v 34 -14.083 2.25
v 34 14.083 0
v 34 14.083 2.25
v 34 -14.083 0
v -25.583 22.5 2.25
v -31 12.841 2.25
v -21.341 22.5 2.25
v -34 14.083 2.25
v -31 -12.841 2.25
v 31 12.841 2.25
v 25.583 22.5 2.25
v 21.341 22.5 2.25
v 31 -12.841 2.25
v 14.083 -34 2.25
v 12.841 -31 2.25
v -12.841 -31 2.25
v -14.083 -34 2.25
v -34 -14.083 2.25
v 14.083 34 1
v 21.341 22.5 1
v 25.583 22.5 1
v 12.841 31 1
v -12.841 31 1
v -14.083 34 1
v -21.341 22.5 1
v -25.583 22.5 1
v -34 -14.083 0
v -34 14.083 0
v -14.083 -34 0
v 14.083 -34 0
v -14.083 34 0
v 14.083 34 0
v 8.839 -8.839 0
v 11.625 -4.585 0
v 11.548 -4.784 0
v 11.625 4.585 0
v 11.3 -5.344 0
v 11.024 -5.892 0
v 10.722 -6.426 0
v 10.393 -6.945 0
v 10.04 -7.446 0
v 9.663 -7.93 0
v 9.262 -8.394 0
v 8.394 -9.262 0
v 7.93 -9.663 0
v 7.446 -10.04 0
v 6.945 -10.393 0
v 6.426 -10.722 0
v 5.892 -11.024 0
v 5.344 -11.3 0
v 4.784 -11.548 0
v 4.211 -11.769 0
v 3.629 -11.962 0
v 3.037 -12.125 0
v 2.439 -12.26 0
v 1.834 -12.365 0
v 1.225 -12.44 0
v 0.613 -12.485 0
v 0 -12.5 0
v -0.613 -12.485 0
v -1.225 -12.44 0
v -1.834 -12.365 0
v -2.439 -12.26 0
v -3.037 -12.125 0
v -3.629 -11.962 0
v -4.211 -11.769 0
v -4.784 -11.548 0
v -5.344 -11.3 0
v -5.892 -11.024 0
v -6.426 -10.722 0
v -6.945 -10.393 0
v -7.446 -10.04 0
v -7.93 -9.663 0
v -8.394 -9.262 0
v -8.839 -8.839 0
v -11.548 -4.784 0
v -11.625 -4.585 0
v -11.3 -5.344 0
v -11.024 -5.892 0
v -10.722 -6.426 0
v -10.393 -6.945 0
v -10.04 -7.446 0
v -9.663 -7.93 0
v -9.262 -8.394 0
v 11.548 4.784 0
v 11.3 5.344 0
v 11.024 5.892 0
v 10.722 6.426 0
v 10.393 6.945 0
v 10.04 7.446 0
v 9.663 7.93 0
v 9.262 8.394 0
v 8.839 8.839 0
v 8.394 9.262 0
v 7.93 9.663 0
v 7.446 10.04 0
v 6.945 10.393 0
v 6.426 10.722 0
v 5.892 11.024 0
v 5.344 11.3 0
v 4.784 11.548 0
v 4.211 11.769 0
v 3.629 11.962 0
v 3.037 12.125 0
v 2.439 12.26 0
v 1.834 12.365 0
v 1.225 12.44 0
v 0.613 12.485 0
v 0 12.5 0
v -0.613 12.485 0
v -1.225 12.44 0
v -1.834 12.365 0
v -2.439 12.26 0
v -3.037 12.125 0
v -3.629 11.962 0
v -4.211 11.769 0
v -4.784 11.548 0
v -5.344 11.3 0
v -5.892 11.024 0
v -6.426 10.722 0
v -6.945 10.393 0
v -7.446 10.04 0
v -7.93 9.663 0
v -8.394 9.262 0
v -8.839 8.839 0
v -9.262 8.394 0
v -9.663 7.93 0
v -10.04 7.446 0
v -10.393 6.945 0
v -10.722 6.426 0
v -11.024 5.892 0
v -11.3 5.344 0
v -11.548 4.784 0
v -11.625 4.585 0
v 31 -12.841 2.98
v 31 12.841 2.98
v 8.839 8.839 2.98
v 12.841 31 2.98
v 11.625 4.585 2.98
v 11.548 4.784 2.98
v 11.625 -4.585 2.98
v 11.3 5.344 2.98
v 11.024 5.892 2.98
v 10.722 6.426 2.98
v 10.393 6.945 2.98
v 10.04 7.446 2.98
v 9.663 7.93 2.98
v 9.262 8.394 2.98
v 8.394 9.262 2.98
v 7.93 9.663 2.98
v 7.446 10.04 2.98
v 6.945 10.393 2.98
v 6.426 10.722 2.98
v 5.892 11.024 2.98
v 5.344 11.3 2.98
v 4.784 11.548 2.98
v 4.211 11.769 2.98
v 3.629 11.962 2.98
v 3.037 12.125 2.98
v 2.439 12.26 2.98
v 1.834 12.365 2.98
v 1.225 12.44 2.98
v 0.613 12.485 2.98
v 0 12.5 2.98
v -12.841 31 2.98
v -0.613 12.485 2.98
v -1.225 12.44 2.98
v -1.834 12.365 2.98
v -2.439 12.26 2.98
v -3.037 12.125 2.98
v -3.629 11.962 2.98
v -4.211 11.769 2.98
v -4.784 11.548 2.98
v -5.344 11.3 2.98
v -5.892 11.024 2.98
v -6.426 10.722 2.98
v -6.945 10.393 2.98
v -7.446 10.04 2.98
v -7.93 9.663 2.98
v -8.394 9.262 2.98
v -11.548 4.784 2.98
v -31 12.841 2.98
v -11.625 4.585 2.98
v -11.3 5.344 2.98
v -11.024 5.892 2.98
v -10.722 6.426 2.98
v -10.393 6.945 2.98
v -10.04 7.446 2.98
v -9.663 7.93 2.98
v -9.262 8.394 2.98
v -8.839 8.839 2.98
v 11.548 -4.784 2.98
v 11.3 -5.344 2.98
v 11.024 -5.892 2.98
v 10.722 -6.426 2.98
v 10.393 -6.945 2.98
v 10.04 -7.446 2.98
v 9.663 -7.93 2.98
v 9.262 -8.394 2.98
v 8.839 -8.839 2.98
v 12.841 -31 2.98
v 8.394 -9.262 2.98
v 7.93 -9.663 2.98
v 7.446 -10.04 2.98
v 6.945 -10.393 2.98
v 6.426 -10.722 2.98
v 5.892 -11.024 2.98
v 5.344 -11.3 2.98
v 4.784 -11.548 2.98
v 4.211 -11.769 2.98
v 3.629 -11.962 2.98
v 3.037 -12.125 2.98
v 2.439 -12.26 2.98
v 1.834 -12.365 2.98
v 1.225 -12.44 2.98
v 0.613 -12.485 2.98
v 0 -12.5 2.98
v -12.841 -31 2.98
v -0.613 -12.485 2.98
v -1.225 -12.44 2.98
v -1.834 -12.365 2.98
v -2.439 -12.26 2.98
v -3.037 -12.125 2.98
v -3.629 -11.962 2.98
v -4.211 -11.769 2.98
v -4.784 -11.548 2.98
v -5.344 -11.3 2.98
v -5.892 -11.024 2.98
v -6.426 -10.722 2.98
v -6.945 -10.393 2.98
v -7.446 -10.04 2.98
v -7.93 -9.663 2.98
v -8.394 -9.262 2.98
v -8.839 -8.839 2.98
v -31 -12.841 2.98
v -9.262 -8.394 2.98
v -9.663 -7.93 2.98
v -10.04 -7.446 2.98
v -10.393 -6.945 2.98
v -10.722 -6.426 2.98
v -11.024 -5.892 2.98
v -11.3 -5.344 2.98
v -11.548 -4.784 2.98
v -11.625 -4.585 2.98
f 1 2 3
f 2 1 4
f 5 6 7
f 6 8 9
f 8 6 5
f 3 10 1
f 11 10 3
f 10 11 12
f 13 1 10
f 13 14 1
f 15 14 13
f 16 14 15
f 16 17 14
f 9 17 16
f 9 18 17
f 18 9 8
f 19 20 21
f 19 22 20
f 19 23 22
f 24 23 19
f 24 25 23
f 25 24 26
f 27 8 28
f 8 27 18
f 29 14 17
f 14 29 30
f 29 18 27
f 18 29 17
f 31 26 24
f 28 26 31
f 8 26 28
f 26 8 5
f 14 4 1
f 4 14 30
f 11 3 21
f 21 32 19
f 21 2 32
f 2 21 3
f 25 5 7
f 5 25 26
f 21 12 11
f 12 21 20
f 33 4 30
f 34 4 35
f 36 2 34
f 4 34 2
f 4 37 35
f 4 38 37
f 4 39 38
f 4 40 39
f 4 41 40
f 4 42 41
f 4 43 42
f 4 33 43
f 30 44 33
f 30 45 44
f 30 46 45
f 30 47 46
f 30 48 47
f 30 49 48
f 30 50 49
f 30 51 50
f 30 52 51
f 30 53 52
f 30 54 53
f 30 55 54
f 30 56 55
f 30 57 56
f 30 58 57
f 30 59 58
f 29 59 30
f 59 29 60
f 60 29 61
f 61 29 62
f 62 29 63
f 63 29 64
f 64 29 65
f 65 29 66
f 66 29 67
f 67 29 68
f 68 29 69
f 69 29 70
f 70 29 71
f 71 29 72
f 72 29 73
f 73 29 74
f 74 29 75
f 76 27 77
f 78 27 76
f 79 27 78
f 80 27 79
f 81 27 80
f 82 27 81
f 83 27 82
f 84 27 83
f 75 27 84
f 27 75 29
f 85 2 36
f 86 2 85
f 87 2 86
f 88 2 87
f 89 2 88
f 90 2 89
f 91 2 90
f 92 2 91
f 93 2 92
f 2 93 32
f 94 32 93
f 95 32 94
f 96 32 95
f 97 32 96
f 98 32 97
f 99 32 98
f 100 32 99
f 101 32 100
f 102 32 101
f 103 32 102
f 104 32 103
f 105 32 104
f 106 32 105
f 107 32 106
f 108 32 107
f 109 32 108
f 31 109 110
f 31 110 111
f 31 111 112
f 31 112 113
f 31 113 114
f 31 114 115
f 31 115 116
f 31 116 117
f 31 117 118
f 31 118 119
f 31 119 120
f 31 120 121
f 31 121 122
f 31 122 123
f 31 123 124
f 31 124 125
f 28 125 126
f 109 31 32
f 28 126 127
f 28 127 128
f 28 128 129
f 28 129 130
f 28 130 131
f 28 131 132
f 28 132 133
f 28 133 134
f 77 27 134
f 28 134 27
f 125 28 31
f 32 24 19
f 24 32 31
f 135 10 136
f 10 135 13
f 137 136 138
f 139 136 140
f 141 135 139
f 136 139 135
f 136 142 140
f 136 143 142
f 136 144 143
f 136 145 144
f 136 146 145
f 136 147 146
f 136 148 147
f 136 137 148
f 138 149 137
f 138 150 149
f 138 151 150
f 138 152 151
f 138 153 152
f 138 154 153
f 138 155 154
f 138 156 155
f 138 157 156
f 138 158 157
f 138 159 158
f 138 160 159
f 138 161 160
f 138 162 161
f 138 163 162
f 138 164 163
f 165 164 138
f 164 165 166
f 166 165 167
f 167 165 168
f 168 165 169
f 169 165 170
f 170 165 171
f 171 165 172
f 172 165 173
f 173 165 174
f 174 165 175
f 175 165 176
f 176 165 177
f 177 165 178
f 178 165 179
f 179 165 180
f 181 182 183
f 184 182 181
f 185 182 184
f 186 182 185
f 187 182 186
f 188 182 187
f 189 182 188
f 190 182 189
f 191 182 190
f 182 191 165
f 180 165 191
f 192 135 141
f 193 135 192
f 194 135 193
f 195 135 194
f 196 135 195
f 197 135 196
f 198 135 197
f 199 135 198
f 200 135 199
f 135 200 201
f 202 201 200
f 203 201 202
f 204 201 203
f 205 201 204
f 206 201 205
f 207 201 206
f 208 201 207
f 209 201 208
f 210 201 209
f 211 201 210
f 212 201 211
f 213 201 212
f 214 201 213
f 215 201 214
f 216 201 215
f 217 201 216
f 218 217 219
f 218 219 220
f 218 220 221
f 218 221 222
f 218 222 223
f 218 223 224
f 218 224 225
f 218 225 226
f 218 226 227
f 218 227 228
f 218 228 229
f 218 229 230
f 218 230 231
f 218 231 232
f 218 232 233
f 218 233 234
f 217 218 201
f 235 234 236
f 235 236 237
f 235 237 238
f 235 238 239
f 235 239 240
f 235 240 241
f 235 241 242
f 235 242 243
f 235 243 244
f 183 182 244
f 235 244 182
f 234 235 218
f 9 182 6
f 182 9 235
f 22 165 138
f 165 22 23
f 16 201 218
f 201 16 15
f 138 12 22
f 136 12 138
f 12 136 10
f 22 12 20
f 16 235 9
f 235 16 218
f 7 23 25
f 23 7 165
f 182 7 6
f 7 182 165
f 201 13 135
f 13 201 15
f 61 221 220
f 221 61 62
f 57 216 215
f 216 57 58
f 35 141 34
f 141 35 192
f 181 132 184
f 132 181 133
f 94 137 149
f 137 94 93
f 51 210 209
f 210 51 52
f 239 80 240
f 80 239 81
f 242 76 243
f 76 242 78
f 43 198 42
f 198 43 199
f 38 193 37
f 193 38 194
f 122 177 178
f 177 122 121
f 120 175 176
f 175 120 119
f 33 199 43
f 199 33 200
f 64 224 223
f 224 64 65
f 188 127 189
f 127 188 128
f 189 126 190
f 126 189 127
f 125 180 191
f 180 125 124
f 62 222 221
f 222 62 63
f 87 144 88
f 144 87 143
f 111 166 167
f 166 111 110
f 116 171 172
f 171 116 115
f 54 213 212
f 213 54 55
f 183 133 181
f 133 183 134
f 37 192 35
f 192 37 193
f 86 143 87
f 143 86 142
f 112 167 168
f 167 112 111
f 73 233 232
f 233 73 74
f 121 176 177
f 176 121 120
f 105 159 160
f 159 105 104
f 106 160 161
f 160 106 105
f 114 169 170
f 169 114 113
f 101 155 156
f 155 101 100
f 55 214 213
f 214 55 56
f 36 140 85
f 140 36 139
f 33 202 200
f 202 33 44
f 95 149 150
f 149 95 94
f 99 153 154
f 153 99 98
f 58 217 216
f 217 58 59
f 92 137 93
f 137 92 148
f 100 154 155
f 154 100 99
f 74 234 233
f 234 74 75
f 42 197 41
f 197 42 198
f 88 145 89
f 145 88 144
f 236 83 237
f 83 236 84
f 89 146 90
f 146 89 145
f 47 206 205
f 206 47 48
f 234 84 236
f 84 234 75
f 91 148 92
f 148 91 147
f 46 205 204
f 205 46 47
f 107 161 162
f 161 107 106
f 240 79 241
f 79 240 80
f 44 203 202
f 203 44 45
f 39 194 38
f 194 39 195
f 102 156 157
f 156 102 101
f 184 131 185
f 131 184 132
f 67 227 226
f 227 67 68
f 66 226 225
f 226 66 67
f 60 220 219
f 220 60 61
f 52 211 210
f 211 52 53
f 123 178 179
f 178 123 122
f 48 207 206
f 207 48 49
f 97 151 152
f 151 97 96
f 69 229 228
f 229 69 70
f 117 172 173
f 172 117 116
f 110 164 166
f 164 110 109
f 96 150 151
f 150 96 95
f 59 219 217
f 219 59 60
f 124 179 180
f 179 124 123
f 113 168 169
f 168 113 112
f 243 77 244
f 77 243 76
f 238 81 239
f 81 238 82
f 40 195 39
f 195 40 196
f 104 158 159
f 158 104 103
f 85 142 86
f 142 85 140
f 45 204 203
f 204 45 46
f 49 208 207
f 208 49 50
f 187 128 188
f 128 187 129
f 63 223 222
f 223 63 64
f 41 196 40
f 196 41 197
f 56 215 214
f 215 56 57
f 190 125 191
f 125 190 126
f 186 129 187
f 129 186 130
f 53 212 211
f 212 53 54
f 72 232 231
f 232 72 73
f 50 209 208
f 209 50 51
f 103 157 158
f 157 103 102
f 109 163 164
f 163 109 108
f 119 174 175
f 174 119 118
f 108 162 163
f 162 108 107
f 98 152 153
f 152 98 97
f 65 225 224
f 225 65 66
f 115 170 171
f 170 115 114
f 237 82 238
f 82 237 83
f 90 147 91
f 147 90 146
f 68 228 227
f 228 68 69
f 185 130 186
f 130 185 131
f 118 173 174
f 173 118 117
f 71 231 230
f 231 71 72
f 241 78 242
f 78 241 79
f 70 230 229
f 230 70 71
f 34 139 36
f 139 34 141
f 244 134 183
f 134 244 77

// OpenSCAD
// file: hardware.scad
function dHex(e2e) = e2e / sin(60);
function rHex(e2e) = dHex(e2e) / 2;

module Hex(e2e, h) {
  r = rHex(e2e);
  x = r * cos(30);
  y = r * sin(30);
  linear_extrude(h) {
    polygon([
      [ r,  0],
      [ y,  x],
      [-y,  x],
      [-r,  0],
      [-y, -x],
      [ y, -x],
    ]);
  }
}

function dThread(std) =
  std == "6-32" ? 4 :
  // If it's not found, it is metric already.
  // Add 1/2mm tolerance so it doesn't bind.
  std + 0.5;

function rThread(std) = dThread(std) / 2;

// Thread diameter
// Thread length
// Thread padding
// Head diameter
// Head length
// Head padding
module ScrewStraightHead(td, tl, tp, hd, hl, hp) {
  translate([0, 0, -tp]) cylinder(d = td, h = tl + tp);
  translate([0, 0,  tl]) cylinder(d = hd, h = hl + hp);
}

// Thread diameter
// Thread length
// Thread padding
// Head diameter
// Head length 1: Length of chamfer.
// Head length 2: Length of head above chamfer edge.
// Head padding
module ScrewChamferHead(td, tl, tp, hd, hl1, hl2, hp) {
  translate([0, 0, -tp      ]) cylinder(d  = td,          h = tl + tp);
  translate([0, 0,  tl      ]) cylinder(d1 = td, d2 = hd, h = hl1);
  translate([0, 0,  tl + hl1]) cylinder(d  = hd,          h = hl2 + hp);
}

// Must provide either
// screw_l && head_l && head_d
// screw_l && thread_l && head_d
// screw_l && head_l1 && head_l2 && head_d1 && head_d2
// screw_l && thread_l && head_d
// thread_l && head_l && head_d
// thread_l && head_l1 && head_l2 && head_d1 && head_d2
module Screw(
  std,
  screw_l = undef,
  thread_l = undef,
  thread_padding = 0,
  head_l = undef,
  head_d = undef,
  head_l1 = undef,
  head_l2 = undef,
  head_padding = 0,
) {
  if (head_l1 && head_l2) {
    ScrewChamferHead(
      dThread(std),
      thread_l ? thread_l : screw_l - head_l1 - head_l2,
      thread_padding,
      head_d,
      head_l1,
      head_l2,
      head_padding
    );
  } else {
    ScrewStraightHead(
      dThread(std),
      thread_l ? thread_l : screw_l - head_l,
      thread_padding,
      head_d,
      head_l,
      head_padding
    );
  }
}

module CaseScrew(thread_padding = 0, head_padding = 0) {
  Screw(
    "6-32",
    screw_l = 9,
    head_l = 3,
    head_d = 9
  );
}

module HillmanNut() {
  Hex(8, 3);
}

module HillmanScrew(thread_padding = 0, head_padding = 0) {
  Screw(
    "6-32",
    screw_l = 13.3,
    head_l1 = 2.5,
    head_l2 = 0.75,
    head_d = 6.5
  );
}
// main file
use <hardware.scad>

$fn = 128;

inside_th = 4;
outside_th = 1;

overhang = 3;
hole_e2e = 62;
lip_e2e = overhang + hole_e2e + overhang;

panel_th = 1.46;

metal_th = 1.25;
metal_dy = hole_e2e / 2 - 8.5;

ethernet_l = 27;
ethernet_stem_d = 25;
ethernet_flat_d = 23.25;

ethernet_face_th = 2.5;
ethernet_face_d = 31;


module ccube(dims) {
  translate([-dims.x / 2, -dims.y / 2]) cube(dims);
}

module EthernetStem(h) {
  intersection() {
    cylinder(d = ethernet_stem_d, h = h);
    ccube([ethernet_flat_d, ethernet_stem_d, h]);
  }
}

module EthernetFace(h) {
  cylinder(d = ethernet_face_d, h = h);
}

module Oct(e2e, h, center = [false, false, false]) {
  dx = center.x ? 0 : e2e/2;
  dy = center.y ? 0 : e2e/2;
  dz = center.z ? -h/2 : 0;
  translate([dx, dy, dz]) {
    intersection() {
      translate([-e2e / 2, -e2e / 2]) cube([e2e, e2e, h]);
      rotate([0, 0, 45])
        translate([-e2e / 2, -e2e / 2]) cube([e2e, e2e, h]);
    }
  }
}

module Hole(h) {
  Oct(hole_e2e, h, [true, true, false]);
}

module Lip(h) {
  Oct(lip_e2e, h, [true, true, false]);
}


module Outside() {
  difference() {
    union() {
      translate([0, 0, outside_th]) {
        difference() {
          Lip(metal_th);
          translate([-lip_e2e / 2, metal_dy, -1])
            cube([lip_e2e, lip_e2e, metal_th + 2]);
        }
      }
      Lip(outside_th);
      Hole(panel_th / 2 + metal_th + outside_th);
    }
    translate([0, 0, -1]) EthernetStem(panel_th / 2 + metal_th + outside_th + 2);
  }
}


module Inside() {
  difference() {
    union() {
      Lip(inside_th - panel_th / 2);
      Hole(inside_th);
    }
    translate([0, 0, -1]) EthernetStem(inside_th + 2);
  }
}

// translate([ lip_e2e/2 + 2, 0])
//   Inside();
// translate([-lip_e2e/2 - 2, 0])
  Outside();
